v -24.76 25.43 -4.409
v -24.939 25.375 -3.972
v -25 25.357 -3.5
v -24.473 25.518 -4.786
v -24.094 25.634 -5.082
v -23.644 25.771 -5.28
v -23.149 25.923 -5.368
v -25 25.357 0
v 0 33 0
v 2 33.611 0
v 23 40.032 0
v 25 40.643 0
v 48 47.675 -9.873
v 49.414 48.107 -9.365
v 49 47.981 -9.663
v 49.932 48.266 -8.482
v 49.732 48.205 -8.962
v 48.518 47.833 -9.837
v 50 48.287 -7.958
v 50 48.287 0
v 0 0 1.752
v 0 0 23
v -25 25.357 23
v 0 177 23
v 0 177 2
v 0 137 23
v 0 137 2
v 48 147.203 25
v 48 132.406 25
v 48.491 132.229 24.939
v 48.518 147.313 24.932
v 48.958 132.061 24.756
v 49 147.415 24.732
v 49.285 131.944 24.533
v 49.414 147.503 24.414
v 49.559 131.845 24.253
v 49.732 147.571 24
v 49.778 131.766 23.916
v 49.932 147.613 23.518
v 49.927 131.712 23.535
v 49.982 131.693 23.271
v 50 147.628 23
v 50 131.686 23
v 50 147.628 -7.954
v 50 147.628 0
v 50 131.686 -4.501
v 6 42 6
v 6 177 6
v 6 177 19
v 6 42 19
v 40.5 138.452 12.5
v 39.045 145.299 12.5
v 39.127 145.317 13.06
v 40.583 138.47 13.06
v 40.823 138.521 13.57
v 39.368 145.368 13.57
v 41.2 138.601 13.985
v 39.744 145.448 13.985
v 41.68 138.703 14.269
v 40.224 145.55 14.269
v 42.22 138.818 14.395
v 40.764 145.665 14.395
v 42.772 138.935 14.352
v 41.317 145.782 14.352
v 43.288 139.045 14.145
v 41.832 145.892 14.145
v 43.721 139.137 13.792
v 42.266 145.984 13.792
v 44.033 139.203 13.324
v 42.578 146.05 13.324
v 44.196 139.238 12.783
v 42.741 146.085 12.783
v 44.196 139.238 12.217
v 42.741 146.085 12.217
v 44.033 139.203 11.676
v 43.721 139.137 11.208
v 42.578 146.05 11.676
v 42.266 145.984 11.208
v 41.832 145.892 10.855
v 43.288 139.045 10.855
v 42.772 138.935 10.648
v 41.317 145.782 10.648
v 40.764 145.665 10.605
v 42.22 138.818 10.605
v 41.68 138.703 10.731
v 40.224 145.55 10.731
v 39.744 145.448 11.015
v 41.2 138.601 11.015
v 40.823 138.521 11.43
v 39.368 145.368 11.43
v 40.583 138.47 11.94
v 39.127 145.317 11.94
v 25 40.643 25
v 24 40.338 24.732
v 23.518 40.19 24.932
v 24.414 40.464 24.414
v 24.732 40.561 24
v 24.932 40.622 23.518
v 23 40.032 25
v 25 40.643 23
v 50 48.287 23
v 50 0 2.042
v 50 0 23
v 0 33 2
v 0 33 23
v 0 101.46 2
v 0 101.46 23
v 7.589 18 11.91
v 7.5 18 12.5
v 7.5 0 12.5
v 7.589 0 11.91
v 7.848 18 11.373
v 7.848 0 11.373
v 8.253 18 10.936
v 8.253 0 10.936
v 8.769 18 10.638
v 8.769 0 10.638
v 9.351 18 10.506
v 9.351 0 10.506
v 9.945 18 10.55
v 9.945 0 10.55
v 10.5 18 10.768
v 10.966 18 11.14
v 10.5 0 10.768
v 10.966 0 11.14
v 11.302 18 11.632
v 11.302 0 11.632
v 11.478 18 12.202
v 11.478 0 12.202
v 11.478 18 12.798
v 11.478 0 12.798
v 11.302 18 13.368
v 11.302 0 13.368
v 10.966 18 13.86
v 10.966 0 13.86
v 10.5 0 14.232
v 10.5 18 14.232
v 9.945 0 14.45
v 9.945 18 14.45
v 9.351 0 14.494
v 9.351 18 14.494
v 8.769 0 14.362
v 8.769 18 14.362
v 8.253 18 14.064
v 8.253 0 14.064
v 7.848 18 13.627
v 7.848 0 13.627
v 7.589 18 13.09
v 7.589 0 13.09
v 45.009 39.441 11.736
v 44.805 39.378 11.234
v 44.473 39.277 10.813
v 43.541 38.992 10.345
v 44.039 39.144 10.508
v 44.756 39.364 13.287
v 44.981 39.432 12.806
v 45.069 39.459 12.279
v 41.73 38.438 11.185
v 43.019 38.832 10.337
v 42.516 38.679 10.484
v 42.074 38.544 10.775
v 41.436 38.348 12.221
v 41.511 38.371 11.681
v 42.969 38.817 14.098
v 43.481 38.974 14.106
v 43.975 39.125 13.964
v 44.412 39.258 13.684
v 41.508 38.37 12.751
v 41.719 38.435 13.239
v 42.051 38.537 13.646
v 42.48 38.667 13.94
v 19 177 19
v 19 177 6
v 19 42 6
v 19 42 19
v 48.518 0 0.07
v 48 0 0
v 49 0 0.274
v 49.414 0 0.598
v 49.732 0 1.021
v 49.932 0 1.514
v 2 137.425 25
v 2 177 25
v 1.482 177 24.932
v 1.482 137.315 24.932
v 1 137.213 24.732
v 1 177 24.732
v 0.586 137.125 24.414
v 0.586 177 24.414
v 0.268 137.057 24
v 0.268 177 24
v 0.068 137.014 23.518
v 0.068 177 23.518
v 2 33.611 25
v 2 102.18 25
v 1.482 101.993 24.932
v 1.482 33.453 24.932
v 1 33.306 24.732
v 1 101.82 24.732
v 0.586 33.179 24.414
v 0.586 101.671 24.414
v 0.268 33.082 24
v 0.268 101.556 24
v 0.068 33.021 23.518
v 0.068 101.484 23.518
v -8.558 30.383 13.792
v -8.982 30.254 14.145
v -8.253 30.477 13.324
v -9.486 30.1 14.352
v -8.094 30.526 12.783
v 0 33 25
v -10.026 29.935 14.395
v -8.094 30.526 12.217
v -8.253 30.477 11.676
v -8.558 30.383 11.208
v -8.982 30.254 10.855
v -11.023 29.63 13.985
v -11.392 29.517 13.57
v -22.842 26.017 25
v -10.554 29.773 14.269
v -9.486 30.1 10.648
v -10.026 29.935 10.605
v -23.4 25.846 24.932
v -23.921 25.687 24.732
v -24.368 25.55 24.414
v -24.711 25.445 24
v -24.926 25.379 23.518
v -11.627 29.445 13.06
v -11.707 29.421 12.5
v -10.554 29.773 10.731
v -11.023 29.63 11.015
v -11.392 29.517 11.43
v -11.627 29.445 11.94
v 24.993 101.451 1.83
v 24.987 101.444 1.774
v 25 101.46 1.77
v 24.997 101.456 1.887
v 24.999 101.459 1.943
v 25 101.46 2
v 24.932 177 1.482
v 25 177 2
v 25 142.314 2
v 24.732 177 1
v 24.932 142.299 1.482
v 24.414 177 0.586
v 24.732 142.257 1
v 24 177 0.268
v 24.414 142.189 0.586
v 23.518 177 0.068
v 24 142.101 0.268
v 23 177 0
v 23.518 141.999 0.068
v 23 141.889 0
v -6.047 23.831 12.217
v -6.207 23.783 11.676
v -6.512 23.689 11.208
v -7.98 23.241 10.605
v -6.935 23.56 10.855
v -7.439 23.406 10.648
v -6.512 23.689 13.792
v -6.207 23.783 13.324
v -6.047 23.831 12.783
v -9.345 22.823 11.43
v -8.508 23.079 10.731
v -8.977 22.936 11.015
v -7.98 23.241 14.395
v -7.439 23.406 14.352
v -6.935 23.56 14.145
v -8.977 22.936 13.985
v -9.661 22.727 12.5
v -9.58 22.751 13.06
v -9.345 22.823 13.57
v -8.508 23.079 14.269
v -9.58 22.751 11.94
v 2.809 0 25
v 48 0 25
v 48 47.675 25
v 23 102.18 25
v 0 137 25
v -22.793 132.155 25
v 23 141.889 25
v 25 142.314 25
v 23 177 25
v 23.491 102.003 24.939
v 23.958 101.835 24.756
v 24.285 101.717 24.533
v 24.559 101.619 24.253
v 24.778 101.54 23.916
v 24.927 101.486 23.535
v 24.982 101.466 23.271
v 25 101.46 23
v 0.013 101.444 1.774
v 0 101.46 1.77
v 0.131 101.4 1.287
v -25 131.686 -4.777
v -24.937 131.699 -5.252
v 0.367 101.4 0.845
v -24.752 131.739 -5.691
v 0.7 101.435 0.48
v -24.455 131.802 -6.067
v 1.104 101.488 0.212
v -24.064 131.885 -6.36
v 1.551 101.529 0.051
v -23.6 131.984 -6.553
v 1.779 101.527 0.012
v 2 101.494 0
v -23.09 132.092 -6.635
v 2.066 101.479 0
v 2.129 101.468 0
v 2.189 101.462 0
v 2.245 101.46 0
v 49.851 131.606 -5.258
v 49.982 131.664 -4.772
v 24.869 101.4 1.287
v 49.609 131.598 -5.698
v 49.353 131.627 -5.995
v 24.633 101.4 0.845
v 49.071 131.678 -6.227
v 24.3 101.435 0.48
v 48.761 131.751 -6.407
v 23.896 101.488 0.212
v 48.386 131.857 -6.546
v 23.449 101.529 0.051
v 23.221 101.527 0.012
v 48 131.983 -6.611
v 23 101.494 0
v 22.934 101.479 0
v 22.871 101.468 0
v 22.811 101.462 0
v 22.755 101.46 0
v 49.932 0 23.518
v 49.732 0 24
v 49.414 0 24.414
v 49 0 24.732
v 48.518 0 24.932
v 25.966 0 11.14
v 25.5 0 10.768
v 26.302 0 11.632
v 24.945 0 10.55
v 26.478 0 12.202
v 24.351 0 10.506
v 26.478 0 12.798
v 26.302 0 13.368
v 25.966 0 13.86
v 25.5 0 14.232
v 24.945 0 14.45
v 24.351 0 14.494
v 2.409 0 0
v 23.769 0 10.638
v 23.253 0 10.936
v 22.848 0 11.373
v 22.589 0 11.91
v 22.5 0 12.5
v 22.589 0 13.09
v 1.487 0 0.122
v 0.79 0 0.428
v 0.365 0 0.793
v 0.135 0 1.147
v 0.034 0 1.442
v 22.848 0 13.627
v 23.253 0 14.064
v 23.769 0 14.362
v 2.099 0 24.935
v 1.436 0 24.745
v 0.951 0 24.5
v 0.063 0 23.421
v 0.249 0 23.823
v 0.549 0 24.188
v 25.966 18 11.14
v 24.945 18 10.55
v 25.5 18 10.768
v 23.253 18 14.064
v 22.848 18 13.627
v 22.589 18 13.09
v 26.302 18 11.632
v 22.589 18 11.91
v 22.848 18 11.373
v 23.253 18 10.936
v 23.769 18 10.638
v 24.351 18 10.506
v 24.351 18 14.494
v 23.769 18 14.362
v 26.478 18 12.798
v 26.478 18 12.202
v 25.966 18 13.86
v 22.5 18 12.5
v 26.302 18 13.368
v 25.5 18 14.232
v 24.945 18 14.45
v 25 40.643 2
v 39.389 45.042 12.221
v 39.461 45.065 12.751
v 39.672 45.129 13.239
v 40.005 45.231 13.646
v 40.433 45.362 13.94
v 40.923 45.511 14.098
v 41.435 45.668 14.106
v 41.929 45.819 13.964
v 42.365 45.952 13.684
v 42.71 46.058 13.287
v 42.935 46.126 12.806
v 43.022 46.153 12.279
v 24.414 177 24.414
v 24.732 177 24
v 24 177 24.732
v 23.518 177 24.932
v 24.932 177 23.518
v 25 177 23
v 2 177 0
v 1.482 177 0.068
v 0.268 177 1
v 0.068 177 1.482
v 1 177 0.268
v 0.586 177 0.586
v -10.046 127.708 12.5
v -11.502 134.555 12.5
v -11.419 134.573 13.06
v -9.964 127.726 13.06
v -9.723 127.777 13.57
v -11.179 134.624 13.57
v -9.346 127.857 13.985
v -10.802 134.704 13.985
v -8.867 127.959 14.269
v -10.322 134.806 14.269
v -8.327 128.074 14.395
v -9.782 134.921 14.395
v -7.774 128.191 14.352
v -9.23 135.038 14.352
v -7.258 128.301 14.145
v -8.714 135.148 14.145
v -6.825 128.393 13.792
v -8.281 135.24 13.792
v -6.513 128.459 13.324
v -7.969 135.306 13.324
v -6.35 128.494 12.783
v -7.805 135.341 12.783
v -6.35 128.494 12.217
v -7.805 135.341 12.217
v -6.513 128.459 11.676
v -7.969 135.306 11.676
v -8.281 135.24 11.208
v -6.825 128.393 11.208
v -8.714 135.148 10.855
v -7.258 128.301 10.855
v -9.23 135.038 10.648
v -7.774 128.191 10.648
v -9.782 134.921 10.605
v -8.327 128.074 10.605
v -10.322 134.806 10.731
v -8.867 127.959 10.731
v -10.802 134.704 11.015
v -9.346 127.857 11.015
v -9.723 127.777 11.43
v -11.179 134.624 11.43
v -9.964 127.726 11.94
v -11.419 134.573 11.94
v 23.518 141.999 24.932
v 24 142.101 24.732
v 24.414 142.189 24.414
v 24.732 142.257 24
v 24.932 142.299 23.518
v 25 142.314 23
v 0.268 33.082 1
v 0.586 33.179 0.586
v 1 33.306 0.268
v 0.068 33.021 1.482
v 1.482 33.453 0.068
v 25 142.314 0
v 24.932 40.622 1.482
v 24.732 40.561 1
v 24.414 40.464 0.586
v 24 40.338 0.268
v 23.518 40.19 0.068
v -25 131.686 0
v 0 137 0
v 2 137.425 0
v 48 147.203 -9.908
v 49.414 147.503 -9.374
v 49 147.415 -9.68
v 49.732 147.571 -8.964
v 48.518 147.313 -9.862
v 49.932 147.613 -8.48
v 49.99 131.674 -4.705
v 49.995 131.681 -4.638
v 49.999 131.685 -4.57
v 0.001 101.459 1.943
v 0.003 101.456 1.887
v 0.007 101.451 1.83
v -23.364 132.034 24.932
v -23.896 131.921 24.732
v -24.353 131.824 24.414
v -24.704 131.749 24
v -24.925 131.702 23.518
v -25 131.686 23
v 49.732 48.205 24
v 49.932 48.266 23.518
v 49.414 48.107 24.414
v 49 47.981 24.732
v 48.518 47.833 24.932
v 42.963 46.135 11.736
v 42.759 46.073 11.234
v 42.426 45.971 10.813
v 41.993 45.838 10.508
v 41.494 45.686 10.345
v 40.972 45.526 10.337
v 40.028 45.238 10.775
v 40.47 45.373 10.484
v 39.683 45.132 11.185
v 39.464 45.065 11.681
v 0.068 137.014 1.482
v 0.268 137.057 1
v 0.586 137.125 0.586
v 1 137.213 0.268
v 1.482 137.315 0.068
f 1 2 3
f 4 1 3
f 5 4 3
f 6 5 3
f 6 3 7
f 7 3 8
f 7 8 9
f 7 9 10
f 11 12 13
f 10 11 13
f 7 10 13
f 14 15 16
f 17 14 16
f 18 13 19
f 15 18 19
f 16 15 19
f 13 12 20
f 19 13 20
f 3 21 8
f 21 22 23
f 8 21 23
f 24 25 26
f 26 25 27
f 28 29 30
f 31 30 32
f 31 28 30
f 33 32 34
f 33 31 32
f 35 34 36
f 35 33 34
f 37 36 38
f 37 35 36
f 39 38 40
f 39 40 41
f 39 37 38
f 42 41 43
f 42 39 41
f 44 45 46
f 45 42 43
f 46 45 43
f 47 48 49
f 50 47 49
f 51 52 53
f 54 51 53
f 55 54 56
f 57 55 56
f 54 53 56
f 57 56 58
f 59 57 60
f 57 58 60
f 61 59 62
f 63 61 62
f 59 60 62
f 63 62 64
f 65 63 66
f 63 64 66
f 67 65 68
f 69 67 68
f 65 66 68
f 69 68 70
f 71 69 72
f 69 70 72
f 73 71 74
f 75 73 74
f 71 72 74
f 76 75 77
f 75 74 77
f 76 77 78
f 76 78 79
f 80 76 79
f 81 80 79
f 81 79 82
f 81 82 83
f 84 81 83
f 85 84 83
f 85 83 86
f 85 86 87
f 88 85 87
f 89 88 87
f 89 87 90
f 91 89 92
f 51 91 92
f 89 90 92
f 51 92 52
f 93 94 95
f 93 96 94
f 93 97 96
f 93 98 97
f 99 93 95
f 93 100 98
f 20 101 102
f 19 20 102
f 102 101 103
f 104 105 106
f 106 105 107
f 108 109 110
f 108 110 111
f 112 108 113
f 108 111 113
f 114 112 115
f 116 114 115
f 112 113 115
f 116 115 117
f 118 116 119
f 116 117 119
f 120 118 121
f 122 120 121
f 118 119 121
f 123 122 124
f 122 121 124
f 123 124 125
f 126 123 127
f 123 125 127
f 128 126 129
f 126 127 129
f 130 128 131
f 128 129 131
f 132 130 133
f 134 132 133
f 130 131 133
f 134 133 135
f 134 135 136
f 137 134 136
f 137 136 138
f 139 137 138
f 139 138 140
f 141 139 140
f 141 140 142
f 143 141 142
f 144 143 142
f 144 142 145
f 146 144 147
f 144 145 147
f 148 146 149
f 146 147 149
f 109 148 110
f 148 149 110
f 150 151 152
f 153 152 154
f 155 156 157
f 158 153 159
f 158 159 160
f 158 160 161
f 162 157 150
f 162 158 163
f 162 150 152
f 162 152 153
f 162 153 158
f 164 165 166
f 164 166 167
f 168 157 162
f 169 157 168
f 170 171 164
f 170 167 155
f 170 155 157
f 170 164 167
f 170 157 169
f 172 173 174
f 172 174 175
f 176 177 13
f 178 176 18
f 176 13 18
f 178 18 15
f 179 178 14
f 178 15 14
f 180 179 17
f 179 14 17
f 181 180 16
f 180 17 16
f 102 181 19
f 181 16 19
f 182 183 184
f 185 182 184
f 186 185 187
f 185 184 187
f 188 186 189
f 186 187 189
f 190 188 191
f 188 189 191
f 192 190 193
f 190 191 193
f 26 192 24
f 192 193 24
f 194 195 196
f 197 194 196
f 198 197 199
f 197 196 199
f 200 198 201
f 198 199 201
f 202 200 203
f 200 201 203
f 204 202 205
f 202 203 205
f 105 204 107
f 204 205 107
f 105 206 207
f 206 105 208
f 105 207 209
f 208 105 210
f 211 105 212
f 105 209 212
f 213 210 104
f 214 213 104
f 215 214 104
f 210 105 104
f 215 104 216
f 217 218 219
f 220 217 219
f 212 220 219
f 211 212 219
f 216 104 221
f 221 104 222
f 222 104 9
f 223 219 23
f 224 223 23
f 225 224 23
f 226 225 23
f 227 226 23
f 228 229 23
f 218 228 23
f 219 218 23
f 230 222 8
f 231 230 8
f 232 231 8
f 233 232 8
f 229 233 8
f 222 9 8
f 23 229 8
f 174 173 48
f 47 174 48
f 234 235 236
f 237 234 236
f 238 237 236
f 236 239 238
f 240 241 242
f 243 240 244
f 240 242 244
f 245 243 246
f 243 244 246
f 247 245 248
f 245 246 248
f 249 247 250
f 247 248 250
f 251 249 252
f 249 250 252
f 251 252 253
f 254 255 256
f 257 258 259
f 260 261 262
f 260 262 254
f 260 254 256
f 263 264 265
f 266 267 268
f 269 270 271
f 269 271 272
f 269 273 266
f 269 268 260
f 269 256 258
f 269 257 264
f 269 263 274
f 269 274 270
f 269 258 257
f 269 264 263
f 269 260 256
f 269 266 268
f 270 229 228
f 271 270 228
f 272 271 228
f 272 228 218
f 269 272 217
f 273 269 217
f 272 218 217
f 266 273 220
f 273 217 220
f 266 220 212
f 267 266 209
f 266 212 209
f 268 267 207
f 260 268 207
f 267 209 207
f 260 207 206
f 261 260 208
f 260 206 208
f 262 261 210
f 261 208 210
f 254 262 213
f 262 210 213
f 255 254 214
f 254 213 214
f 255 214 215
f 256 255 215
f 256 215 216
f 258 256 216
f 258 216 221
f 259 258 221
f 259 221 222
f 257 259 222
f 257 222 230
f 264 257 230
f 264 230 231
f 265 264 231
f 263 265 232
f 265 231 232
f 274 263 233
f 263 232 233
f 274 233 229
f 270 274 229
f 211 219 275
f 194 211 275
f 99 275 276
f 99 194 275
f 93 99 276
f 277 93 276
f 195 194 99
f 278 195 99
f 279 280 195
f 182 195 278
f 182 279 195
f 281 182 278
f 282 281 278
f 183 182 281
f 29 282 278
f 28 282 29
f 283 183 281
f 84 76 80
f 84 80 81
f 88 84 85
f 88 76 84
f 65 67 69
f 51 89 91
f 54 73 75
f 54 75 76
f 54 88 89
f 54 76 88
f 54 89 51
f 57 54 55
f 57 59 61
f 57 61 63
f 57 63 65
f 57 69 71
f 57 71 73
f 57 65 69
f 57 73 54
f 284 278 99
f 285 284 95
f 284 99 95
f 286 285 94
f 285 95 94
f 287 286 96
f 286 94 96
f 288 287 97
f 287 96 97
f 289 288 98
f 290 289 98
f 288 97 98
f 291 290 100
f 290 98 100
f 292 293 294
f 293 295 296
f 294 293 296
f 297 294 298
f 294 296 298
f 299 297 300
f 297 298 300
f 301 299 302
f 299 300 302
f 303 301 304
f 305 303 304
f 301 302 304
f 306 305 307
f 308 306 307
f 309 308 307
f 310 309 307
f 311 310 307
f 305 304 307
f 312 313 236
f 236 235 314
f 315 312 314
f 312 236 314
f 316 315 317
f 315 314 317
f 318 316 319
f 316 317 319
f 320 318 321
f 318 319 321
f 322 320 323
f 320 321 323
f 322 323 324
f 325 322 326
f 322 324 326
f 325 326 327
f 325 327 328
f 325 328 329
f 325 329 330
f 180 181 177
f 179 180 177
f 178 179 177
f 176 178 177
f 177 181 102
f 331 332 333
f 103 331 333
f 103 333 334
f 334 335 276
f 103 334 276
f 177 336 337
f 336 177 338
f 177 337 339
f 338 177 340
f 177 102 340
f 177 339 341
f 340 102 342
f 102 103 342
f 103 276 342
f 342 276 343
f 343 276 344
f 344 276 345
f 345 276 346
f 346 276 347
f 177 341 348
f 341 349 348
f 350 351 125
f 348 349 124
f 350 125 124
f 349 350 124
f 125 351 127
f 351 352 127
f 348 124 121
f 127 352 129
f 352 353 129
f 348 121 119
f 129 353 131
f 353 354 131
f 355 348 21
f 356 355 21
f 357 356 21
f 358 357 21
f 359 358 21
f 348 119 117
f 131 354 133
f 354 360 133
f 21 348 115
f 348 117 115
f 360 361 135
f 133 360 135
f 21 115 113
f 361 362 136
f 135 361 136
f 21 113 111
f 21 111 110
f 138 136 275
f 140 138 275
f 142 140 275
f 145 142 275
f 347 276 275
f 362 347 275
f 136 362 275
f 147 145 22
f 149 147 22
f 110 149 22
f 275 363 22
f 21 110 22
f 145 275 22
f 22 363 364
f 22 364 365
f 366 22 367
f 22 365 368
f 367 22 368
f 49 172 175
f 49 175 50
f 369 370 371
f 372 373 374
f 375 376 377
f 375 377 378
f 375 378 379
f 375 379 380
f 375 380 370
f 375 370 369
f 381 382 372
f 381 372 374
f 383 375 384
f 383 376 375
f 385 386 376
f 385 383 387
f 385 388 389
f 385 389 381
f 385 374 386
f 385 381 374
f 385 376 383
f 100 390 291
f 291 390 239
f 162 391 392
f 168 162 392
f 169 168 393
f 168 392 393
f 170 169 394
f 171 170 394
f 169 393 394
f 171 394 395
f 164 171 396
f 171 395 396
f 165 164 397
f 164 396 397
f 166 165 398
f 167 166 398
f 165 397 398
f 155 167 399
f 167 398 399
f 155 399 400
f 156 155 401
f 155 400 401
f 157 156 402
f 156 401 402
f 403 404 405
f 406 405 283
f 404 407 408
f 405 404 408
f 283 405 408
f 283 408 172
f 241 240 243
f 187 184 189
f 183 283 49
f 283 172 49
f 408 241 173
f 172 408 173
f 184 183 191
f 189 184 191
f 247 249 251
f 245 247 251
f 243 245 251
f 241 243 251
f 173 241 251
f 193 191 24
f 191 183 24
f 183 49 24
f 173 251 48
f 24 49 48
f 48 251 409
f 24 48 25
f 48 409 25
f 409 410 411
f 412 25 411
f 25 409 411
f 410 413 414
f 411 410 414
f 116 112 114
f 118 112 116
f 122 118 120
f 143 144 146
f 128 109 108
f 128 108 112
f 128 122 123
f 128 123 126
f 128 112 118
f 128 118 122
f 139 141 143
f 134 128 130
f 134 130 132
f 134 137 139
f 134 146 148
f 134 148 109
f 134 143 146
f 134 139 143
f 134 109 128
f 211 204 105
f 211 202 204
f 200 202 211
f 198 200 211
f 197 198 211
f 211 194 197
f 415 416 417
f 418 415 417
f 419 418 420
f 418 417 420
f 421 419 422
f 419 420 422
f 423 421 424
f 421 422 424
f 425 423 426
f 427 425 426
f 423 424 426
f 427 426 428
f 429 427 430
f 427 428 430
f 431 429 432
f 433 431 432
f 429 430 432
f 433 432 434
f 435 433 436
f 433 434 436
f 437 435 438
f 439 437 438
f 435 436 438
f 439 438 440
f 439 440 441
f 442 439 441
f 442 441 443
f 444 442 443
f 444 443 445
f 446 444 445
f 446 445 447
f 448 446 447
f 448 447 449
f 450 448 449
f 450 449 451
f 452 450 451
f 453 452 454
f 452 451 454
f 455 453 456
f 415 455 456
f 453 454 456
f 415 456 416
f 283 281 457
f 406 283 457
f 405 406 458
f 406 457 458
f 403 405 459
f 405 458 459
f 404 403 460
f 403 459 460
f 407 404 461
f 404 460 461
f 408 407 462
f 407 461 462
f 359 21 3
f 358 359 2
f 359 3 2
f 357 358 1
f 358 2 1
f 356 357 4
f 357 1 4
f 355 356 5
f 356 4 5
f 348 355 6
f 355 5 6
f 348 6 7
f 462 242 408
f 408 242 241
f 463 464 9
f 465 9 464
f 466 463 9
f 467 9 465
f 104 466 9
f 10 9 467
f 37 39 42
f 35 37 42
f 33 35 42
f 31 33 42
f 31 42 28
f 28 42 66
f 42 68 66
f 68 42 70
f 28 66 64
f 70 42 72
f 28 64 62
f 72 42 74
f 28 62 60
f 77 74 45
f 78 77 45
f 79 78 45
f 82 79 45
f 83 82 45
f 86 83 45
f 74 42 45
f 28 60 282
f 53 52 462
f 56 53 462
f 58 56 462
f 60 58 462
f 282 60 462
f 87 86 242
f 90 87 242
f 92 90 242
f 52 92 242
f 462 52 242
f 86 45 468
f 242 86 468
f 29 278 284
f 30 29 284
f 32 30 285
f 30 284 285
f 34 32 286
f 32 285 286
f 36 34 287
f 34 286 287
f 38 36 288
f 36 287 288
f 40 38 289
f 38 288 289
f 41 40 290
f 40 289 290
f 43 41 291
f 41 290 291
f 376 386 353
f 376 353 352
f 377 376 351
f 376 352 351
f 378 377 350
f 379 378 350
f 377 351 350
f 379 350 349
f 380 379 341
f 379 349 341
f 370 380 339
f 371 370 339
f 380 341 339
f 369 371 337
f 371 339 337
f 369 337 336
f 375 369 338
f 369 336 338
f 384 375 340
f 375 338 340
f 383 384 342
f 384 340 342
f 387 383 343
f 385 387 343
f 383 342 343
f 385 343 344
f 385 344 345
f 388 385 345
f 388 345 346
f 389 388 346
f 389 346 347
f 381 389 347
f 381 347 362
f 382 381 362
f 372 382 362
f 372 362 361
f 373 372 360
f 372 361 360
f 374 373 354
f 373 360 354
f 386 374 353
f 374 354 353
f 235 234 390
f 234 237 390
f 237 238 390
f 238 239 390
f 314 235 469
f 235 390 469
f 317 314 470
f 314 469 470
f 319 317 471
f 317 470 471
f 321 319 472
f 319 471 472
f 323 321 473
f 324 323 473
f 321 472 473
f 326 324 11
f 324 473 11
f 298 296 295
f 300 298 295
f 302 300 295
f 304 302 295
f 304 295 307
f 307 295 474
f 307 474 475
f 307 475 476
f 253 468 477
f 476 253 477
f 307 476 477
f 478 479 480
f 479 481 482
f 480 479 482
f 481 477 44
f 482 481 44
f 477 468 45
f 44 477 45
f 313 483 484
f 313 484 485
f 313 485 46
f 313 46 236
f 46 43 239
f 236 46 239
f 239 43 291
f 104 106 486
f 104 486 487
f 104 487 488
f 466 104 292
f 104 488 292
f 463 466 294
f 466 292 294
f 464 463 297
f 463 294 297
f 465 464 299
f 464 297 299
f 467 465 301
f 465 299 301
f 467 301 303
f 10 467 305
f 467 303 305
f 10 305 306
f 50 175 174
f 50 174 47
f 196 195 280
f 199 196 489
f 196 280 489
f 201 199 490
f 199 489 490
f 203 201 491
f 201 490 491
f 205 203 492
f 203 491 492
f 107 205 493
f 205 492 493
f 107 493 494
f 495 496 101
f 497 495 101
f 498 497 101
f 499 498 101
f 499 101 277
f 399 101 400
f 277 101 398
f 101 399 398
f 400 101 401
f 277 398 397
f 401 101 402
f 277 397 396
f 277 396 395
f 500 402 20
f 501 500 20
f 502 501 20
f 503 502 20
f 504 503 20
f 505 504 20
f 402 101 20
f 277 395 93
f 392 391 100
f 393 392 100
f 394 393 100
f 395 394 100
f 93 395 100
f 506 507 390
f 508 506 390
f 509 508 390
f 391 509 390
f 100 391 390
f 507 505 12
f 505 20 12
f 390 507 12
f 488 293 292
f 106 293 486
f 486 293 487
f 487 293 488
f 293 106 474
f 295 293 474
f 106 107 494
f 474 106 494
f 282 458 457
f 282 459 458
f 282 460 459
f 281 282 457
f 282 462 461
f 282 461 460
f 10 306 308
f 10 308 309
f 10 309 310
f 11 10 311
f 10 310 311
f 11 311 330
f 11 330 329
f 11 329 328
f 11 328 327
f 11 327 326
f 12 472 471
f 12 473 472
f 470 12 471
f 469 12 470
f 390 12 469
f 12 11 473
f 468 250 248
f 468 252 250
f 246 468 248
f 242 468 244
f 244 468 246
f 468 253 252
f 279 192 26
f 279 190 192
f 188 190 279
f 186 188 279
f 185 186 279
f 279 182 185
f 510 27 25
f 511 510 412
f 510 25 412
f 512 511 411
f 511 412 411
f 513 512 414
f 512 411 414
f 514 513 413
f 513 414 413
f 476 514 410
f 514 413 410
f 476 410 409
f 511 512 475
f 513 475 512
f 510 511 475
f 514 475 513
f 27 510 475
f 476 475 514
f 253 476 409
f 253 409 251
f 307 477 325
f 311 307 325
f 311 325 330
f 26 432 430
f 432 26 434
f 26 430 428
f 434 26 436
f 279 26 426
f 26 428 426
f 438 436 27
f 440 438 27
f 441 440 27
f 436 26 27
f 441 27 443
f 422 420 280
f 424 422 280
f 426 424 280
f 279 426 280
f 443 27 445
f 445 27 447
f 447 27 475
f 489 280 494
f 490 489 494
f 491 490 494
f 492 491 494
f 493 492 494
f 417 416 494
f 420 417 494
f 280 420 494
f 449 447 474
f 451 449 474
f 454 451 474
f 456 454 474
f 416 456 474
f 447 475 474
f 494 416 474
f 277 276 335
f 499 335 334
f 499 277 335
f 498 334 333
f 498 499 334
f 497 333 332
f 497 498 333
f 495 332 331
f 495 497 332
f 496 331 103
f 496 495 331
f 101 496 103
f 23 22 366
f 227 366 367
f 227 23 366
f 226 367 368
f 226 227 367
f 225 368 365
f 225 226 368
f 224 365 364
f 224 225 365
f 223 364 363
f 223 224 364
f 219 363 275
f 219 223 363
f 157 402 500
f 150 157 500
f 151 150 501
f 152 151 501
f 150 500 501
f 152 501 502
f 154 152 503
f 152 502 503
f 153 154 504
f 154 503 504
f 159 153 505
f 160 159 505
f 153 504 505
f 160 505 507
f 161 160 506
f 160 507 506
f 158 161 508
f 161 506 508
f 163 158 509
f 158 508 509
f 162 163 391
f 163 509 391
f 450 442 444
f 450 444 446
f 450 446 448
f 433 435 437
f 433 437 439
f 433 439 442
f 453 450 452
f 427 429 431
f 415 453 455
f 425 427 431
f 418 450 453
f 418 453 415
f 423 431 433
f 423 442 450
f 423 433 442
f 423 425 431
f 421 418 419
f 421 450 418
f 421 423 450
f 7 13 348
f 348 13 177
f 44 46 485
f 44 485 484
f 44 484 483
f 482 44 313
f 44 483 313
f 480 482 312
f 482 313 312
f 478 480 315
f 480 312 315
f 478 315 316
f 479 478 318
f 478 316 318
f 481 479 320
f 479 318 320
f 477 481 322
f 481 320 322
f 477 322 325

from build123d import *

# Parameters (mm, degrees)
F0_W           = 25
F0_H           = 33
F1_DEPTH       = 25
F3_DEPTH       = 10
F5_DEPTH       = 81.7
F7_DEPTH       = 10
F9_DEPTH       = 92
F10_W          = 13
F10_H          = 13
F11_DEPTH      = 135
F12_R          = 1.9
F13_DEPTH      = 7
F14_R          = 1.9
F15_DEPTH      = 7
F17_DEPTH      = 18
F18_T1_DEPTH   = 26.3114146799
F18_T3_DEPTH   = 25.9417421253
F18_T5_DEPTH   = 59.3111485648
F18_T7_DEPTH   = 58.2865340729
F18_T9_DEPTH   = 45.6084808239
F18_T11_DEPTH  = 44.6581070284
F18_T16_DEPTH  = 49.2253281189
F18_T21_DEPTH  = 48.4985768834
F18_T27_DEPTH  = 48.4985768834
F18_T33_DEPTH  = 48.4985768834
F18_T39_DEPTH  = 48.4985768834
F18_T45_DEPTH  = 48.4985768834
F18_T51_DEPTH  = 48.4985768834
F18_T57_DEPTH  = 49.2253281189
F18_T62_DEPTH  = 70.8165659944
F18_T69_DEPTH  = 70.8165659944
F18_T75_DEPTH  = 70.8165659944
F18_T81_DEPTH  = 70.8165659944
F18_T87_DEPTH  = 78.4598330308
F18_T93_DEPTH  = 78.4598330308
F18_T99_DEPTH  = 78.4598330308
F18_T106_DEPTH = 78.4598330308
F18_T112_DEPTH = 50
F18_T117_DEPTH = 50
F18_T122_DEPTH = 44.6860859582
F18_T127_DEPTH = 44.6860859582
F18_T133_DEPTH = 70.8165659944
F18_T137_DEPTH = 49.2253281189
F18_T144_DEPTH = 70.8165659944
F18_T149_DEPTH = 48.4985768834
F18_T157_DEPTH = 48.4985768834
F18_T162_DEPTH = 78.4598330308
F18_T170_DEPTH = 49.2253281189
F18_T174_DEPTH = 78.4598330308


# Not quite as in the source:
# - a fillet or chamfer that OpenCascade refuses, or shapes differently, is made with other operations: its cross-section is extruded or revolved along the edge and cut away or added


with BuildPart() as f1:
    # F0 (on Top) → F1 (new body)
    with BuildSketch(Plane.XY):
        with Locations((12.5, 16.5)):
            Rectangle(F0_W, F0_H)
        Polygon((-25, 25.3567329635), (0, 0), (0, 33), align=None)
        with Locations((37.5, 16.5)):
            Rectangle(F0_W, F0_H)
        Polygon((25, 40.6432670365), (0, 33), (25, 33), align=None)
        Polygon((0, 101.4598330308), (0, 33), (25, 40.6432670365), (25, 101.4598330308), (25, 137), (0, 137), align=None)
        Polygon((25, 40.6432670365), (25, 33), (50, 33), (50, 48.2865340729), align=None)
        Polygon((-25, 131.6860859582), (0, 101.4598330308), (0, 137), align=None)
        Polygon((25, 137), (25, 101.4598330308), (50, 131.6860859582), (50, 147.6278280835), (25, 142.3139140418), align=None)
        Polygon((25, 142.3139140418), (0, 137), (25, 137), align=None)
        Polygon((0, 177), (0, 137), (25, 142.3139140418), (25, 177), align=None)
    extrude(amount=F1_DEPTH)

    # F2 (on face) → F3 (join)
    with BuildSketch(Plane(origin=(0, 0, 0), x_dir=(1, 0, 0), z_dir=(0, 0, -1))):
        Polygon((50, -131.6860859582), (25, -101.4598330308), (0, -101.4598330308), (-25, -131.6860859582), (50, -147.6278280835), align=None)
    extrude(amount=F3_DEPTH)

    # F4 (on face) → F5 (cut, symmetric)
    with BuildSketch(Plane.YZ.offset(25)):
        Polygon((101.4598330308, -21.1370438337), (147.6278330308, -10), (101.4598330308, 0), align=None)
    extrude(amount=F5_DEPTH, both=True, mode=Mode.SUBTRACT)

    # F6 (on face) → F7 (join)
    with BuildSketch(Plane(origin=(0, 0, 0), x_dir=(1, 0, 0), z_dir=(0, 0, -1))):
        Polygon((50, -48.2865340729), (50, 0), (0, 0), (-25, -25.3567329635), align=None)
    extrude(amount=F7_DEPTH)

    # F8 (on face) → F9 (cut)
    with BuildSketch(Plane.YZ.offset(50)):
        Polygon((48.2865340729, -10), (0, 0), (0, -39.534393698), (48.2865340729, -39.534393698), align=None)
    extrude(amount=-F9_DEPTH, mode=Mode.SUBTRACT)

    # F10 (on face) → F11 (cut)
    with BuildSketch(Plane(origin=(0, 177, 0), x_dir=(-1, 0, 0), z_dir=(0, 1, 0))):
        with Locations((-12.5, 12.5)):
            Rectangle(F10_W, F10_H)
    extrude(amount=-F11_DEPTH, mode=Mode.SUBTRACT)

    # F12 (on face) → F13 (cut)
    with BuildSketch(Plane(origin=(-27.8614600507, 131.0778638485, 0), x_dir=(-0.9781476007, -0.2079116908, 0), z_dir=(-0.2079116908, 0.9781476007, 0))):
        with Locations((-18.6253867704, 12.5)):
            Circle(F12_R)
        with BuildLine():
            ThreePointArc((-72.2009313853, 12.5), (-70.3009313853, 10.6), (-68.4009313853, 12.5))
            ThreePointArc((-68.4009313853, 12.5), (-70.3009313853, 14.4), (-72.2009313853, 12.5))
        make_face()
    extrude(amount=-F13_DEPTH, mode=Mode.SUBTRACT)

    # F14 (on face) → F15 (cut)
    with BuildSketch(Plane(origin=(-9.2266829073, 30.1791199472, 0), x_dir=(-0.956304756, -0.2923717047, 0), z_dir=(-0.2923717047, 0.956304756, 0))):
        with Locations((0.6940276563, 12.5)):
            Circle(F14_R)
        with BuildLine():
            ThreePointArc((-54.6362143833, 12.2785296088), (-52.7659137894, 10.3211052927), (-50.8370889828, 12.2208866302))
            ThreePointArc((-50.8370889828, 12.2208866302), (-52.7082641762, 14.1206679678), (-54.6362143833, 12.2785296088))
        make_face()
    extrude(amount=-F15_DEPTH, mode=Mode.SUBTRACT)

    # F16 (on face) → F17 (cut)
    with BuildSketch(Plane.XZ):
        with BuildLine():
            ThreePointArc((11.5, 12.5), (9.5, 14.5), (7.5, 12.5))
            Line((7.5, 12.5), (9.5, 12.5))
            Line((9.5, 12.5), (11.5, 12.5))
        make_face()
        with BuildLine():
            ThreePointArc((26.5, 12.5), (24.5, 14.5), (22.5, 12.5))
            ThreePointArc((22.5, 12.5), (24.5, 10.5), (26.5, 12.5))
        make_face()
        with BuildLine():
            Line((9.5, 12.5), (7.5, 12.5))
            ThreePointArc((7.5, 12.5), (9.5, 10.5), (11.5, 12.5))
            Line((11.5, 12.5), (9.5, 12.5))
        make_face()
    extrude(amount=-F17_DEPTH, mode=Mode.SUBTRACT)

    # F18: fillet of radius 2 on 18 edges, made by hand

    # F18_s2 → F18_t1 (cut)
    with BuildSketch(Plane(origin=(0, 122.2526609766, -26.4799560251), x_dir=(1, 0, 0), z_dir=(0, 0.9773365731, -0.2116913388))):
        with BuildLine():
            ThreePointArc((50, -23.478167891), (49.4142135624, -22.0639543286), (48, -21.478167891))
            Line((48, -21.478167891), (50, -21.478167891))
            Line((50, -21.478167891), (50, -23.478167891))
        make_face()
    extrude(amount=F18_T1_DEPTH, mode=Mode.SUBTRACT)

    # F18_s4 → F18_t3 (cut)
    with BuildSketch(Plane.XZ.offset(-152.6278280835)):
        with BuildLine():
            ThreePointArc((48, 25), (49.4142135624, 24.4142135624), (50, 23))
            Line((50, 23), (50, 25))
            Line((50, 25), (48, 25))
        make_face()
    extrude(amount=F18_T3_DEPTH, mode=Mode.SUBTRACT)

    # F18_s6 → F18_t5 (cut)
    with BuildSketch(Plane(origin=(0, 53.1826412899, -11.0139694867), x_dir=(1, 0, 0), z_dir=(0, -0.9792214434, 0.2027938973))):
        with BuildLine():
            ThreePointArc((48, 0), (49.4142135624, 0.5857864376), (50, 2))
            Line((50, 2), (50, 0))
            Line((50, 0), (48, 0))
        make_face()
    extrude(amount=F18_T5_DEPTH, mode=Mode.SUBTRACT)

    # F18_s8 → F18_t7 (cut)
    with BuildSketch(Plane.XZ.offset(-53.2865340729)):
        with BuildLine():
            ThreePointArc((48, 25), (49.4142135624, 24.4142135624), (50, 23))
            Line((50, 23), (50, 25))
            Line((50, 25), (48, 25))
        make_face()
    extrude(amount=F18_T7_DEPTH, mode=Mode.SUBTRACT)

    # F18_s10 → F18_t9 (cut)
    with BuildSketch(Plane(origin=(-28.5103996887, 28.9172236636, 0), x_dir=(0, 0, 1), z_dir=(0.7020799377, -0.71209814, 0))):
        with BuildLine():
            ThreePointArc((23, 0), (24.4142135624, -0.5857864376), (25, -2))
            Line((25, -2), (25, 0))
            Line((25, 0), (23, 0))
        make_face()
    extrude(amount=F18_T9_DEPTH, mode=Mode.SUBTRACT)

    # F18_s12 → F18_t11 (cut)
    with BuildSketch(Plane(origin=(-28.0090391043, 28.4087090053, -5.8833605581), x_dir=(0.71209814, 0.7020799377, 0), z_dir=(0.6945676893, -0.7044786969, 0.145895478))):
        with BuildLine():
            ThreePointArc((0, 1.7328989819), (0.4884593774, 0.4232253789), (1.7152449464, -0.2467258713))
            Line((1.7152449464, -0.2467258713), (0, 0))
            Line((0, 0), (0, 1.7328989819))
        make_face()
    extrude(amount=F18_T11_DEPTH, mode=Mode.SUBTRACT)


with BuildPart() as f18_tool14:
    # F18_s15 → F18_t16 (new body)
    with BuildSketch(Plane(origin=(56.7978037382, 68.6713912604, 0), x_dir=(0, 0, 1), z_dir=(0.6373432983, 0.7705799894, 0))):
        with BuildLine():
            ThreePointArc((25, -47.4002448925), (24.4142135624, -45.9860313302), (23, -45.4002448925))
            Line((23, -45.4002448925), (25, -45.4002448925))
            Line((25, -45.4002448925), (25, -47.4002448925))
        make_face()
    extrude(amount=F18_T16_DEPTH)

    split(bisect_by=Plane.YZ.offset(25), keep=Keep.TOP)


with BuildPart() as f1_1:
    add(f1.part)

    # F18_t13: cut F18_tool14
    add(f18_tool14.part, mode=Mode.SUBTRACT)


with BuildPart() as f18_tool19:
    # F18_s20 → F18_t21 (new body)
    with BuildSketch(Plane(origin=(55.6145080943, 67.2407275237, -14.5643578937), x_dir=(-0.7705799894, 0.6373432983, 0), z_dir=(0.6286469564, 0.7600656763, -0.1646304099))):
        with BuildLine():
            ThreePointArc((45.4002448925, 17.2405635017), (45.8936460368, 15.9252080791), (47.1304047803, 15.258850527))
            Line((47.1304047803, 15.258850527), (45.4002448925, 15.4944378922))
            Line((45.4002448925, 15.4944378922), (45.4002448925, 17.2405635017))
        make_face()
    extrude(amount=F18_T21_DEPTH)

    split(bisect_by=Plane.YZ.offset(25), keep=Keep.BOTTOM)

    split(bisect_by=Plane.XY, keep=Keep.BOTTOM)


with BuildPart() as f1_2:
    add(f1_1.part)

    # F18_t18: cut F18_tool19
    add(f18_tool19.part, mode=Mode.SUBTRACT)


with BuildPart() as f18_tool25:
    # F18_s26 → F18_t27 (new body)
    with BuildSketch(Plane(origin=(55.6145080943, 67.2407275237, -14.5643578937), x_dir=(-0.7705799894, 0.6373432983, 0), z_dir=(0.6286469564, 0.7600656763, -0.1646304099))):
        with BuildLine():
            ThreePointArc((45.4002448925, 17.2405635017), (45.8936460368, 15.9252080791), (47.1304047803, 15.258850527))
            Line((47.1304047803, 15.258850527), (45.4002448925, 15.4944378922))
            Line((45.4002448925, 15.4944378922), (45.4002448925, 17.2405635017))
        make_face()
    extrude(amount=F18_T27_DEPTH)

    split(bisect_by=Plane.YZ.offset(25), keep=Keep.TOP)

    split(bisect_by=Plane.XY, keep=Keep.TOP)


with BuildPart() as f1_3:
    add(f1_2.part)

    # F18_t24: cut F18_tool25
    add(f18_tool25.part, mode=Mode.SUBTRACT)


with BuildPart() as f18_tool31:
    # F18_s32 → F18_t33 (new body)
    with BuildSketch(Plane(origin=(55.6145080943, 67.2407275237, -14.5643578937), x_dir=(-0.7705799894, 0.6373432983, 0), z_dir=(0.6286469564, 0.7600656763, -0.1646304099))):
        with BuildLine():
            ThreePointArc((45.4002448925, 17.2405635017), (45.8936460368, 15.9252080791), (47.1304047803, 15.258850527))
            Line((47.1304047803, 15.258850527), (45.4002448925, 15.4944378922))
            Line((45.4002448925, 15.4944378922), (45.4002448925, 17.2405635017))
        make_face()
    extrude(amount=F18_T33_DEPTH)

    split(bisect_by=Plane.YZ.offset(25), keep=Keep.TOP)

    split(bisect_by=Plane.XY, keep=Keep.BOTTOM)


with BuildPart() as f1_4:
    add(f1_3.part)

    # F18_t30: cut F18_tool31
    add(f18_tool31.part, mode=Mode.SUBTRACT)


with BuildPart() as f18_tool37:
    # F18_s38 → F18_t39 (new body)
    with BuildSketch(Plane(origin=(-76.2230659478, 92.1575068097, -19.9613383317), x_dir=(0.7705799894, 0.6373432983, 0), z_dir=(0.6286469564, -0.7600656763, 0.1646304099))):
        with BuildLine():
            ThreePointArc((64.6647446284, 14.617411291), (65.1581457726, 13.3020558683), (66.3949045162, 12.6356983163))
            Line((66.3949045162, 12.6356983163), (64.6647446284, 12.8712856815))
            Line((64.6647446284, 12.8712856815), (64.6647446284, 14.617411291))
        make_face()
    extrude(amount=F18_T39_DEPTH)

    split(bisect_by=Plane.YZ, keep=Keep.BOTTOM)

    split(bisect_by=Plane.XY, keep=Keep.BOTTOM)


with BuildPart() as f1_5:
    add(f1_4.part)

    # F18_t36: cut F18_tool37
    add(f18_tool37.part, mode=Mode.SUBTRACT)


with BuildPart() as f18_tool43:
    # F18_s44 → F18_t45 (new body)
    with BuildSketch(Plane(origin=(-76.2230659478, 92.1575068097, -19.9613383317), x_dir=(0.7705799894, 0.6373432983, 0), z_dir=(0.6286469564, -0.7600656763, 0.1646304099))):
        with BuildLine():
            ThreePointArc((64.6647446284, 14.617411291), (65.1581457726, 13.3020558683), (66.3949045162, 12.6356983163))
            Line((66.3949045162, 12.6356983163), (64.6647446284, 12.8712856815))
            Line((64.6647446284, 12.8712856815), (64.6647446284, 14.617411291))
        make_face()
    extrude(amount=F18_T45_DEPTH)

    split(bisect_by=Plane.YZ, keep=Keep.TOP)

    split(bisect_by=Plane.XY, keep=Keep.BOTTOM)


with BuildPart() as f1_6:
    add(f1_5.part)

    # F18_t42: cut F18_tool43
    add(f18_tool43.part, mode=Mode.SUBTRACT)


with BuildPart() as f18_tool49:
    # F18_s50 → F18_t51 (new body)
    with BuildSketch(Plane(origin=(-76.2230659478, 92.1575068097, -19.9613383317), x_dir=(0.7705799894, 0.6373432983, 0), z_dir=(0.6286469564, -0.7600656763, 0.1646304099))):
        with BuildLine():
            ThreePointArc((64.6647446284, 14.617411291), (65.1581457726, 13.3020558683), (66.3949045162, 12.6356983163))
            Line((66.3949045162, 12.6356983163), (64.6647446284, 12.8712856815))
            Line((64.6647446284, 12.8712856815), (64.6647446284, 14.617411291))
        make_face()
    extrude(amount=F18_T51_DEPTH)

    split(bisect_by=Plane.YZ, keep=Keep.BOTTOM)

    split(bisect_by=Plane.XY, keep=Keep.TOP)


with BuildPart() as f1_7:
    add(f1_6.part)

    # F18_t48: cut F18_tool49
    add(f18_tool49.part, mode=Mode.SUBTRACT)


with BuildPart() as f18_tool55:
    # F18_s56 → F18_t57 (new body)
    with BuildSketch(Plane(origin=(-78.016074724, 94.3253442805, 0), x_dir=(0, 0, 1), z_dir=(0.6373432983, -0.7705799894, 0))):
        with BuildLine():
            ThreePointArc((25, -66.6647446284), (24.4142135624, -65.250531066), (23, -64.6647446284))
            Line((23, -64.6647446284), (25, -64.6647446284))
            Line((25, -64.6647446284), (25, -66.6647446284))
        make_face()
    extrude(amount=F18_T57_DEPTH)

    split(bisect_by=Plane.YZ, keep=Keep.BOTTOM)


with BuildPart() as f1_8:
    add(f1_7.part)

    # F18_t54: cut F18_tool55
    add(f18_tool55.part, mode=Mode.SUBTRACT)


with BuildPart() as f18_tool60:
    # F18_s61 → F18_t62 (new body)
    with BuildSketch(Plane.XZ.offset(-35.6432670365)):
        with BuildLine():
            ThreePointArc((25, 2), (24.4142135624, 0.5857864376), (23, 0))
            Line((23, 0), (25, 0))
            Line((25, 0), (25, 2))
        make_face()
    extrude(amount=-F18_T62_DEPTH)

    split(bisect_by=Plane(origin=(-9.2266829073, 30.1791199472, 0), x_dir=(0, 0, 1), z_dir=(-0.2923717047, 0.956304756, 0)), keep=Keep.TOP)

    split(bisect_by=Plane(origin=(-34.9845202296, 28.9355418232, 0), x_dir=(0, 0, 1), z_dir=(0.7705799894, -0.6373432983, 0)), keep=Keep.TOP)

    split(bisect_by=Plane(origin=(0, 4.5467421163, 20.9913990025), x_dir=(1, 0, 0), z_dir=(0, -0.2116913388, -0.9773365731)), keep=Keep.TOP)


with BuildPart() as f1_9:
    add(f1_8.part)

    # F18_t59: cut F18_tool60
    add(f18_tool60.part, mode=Mode.SUBTRACT)


with BuildPart() as f18_tool67:
    # F18_s68 → F18_t69 (new body)
    with BuildSketch(Plane.XZ.offset(-35.6432670365)):
        with BuildLine():
            ThreePointArc((25, 2), (24.4142135624, 0.5857864376), (23, 0))
            Line((23, 0), (25, 0))
            Line((25, 0), (25, 2))
        make_face()
    extrude(amount=-F18_T69_DEPTH)

    split(bisect_by=Plane(origin=(-34.9845202296, 28.9355418232, 0), x_dir=(0, 0, 1), z_dir=(-0.7705799894, 0.6373432983, 0)), keep=Keep.TOP)

    split(bisect_by=Plane(origin=(0, 4.5467421163, 20.9913990025), x_dir=(1, 0, 0), z_dir=(0, -0.2116913388, -0.9773365731)), keep=Keep.TOP)


with BuildPart() as f1_10:
    add(f1_9.part)

    # F18_t66: cut F18_tool67
    add(f18_tool67.part, mode=Mode.SUBTRACT)


with BuildPart() as f18_tool73:
    # F18_s74 → F18_t75 (new body)
    with BuildSketch(Plane.XZ.offset(-35.6432670365)):
        with BuildLine():
            ThreePointArc((25, 2), (24.4142135624, 0.5857864376), (23, 0))
            Line((23, 0), (25, 0))
            Line((25, 0), (25, 2))
        make_face()
    extrude(amount=-F18_T75_DEPTH)

    split(bisect_by=Plane(origin=(-34.9845202296, 28.9355418232, 0), x_dir=(0, 0, 1), z_dir=(0.7705799894, -0.6373432983, 0)), keep=Keep.TOP)

    split(bisect_by=Plane(origin=(0, 4.5467421163, 20.9913990025), x_dir=(1, 0, 0), z_dir=(0, 0.2116913388, 0.9773365731)), keep=Keep.TOP)


with BuildPart() as f1_11:
    add(f1_10.part)

    # F18_t72: cut F18_tool73
    add(f18_tool73.part, mode=Mode.SUBTRACT)


with BuildPart() as f18_tool79:
    # F18_s80 → F18_t81 (new body)
    with BuildSketch(Plane.XZ.offset(-35.6432670365)):
        with BuildLine():
            ThreePointArc((23, 25), (24.4142135624, 24.4142135624), (25, 23))
            Line((25, 23), (25, 25))
            Line((25, 25), (23, 25))
        make_face()
    extrude(amount=-F18_T81_DEPTH)

    split(bisect_by=Plane(origin=(-9.2266829073, 30.1791199472, 0), x_dir=(0, 0, 1), z_dir=(-0.2923717047, 0.956304756, 0)), keep=Keep.TOP)

    split(bisect_by=Plane(origin=(-34.9845202296, 28.9355418232, 0), x_dir=(0, 0, 1), z_dir=(0.7705799894, -0.6373432983, 0)), keep=Keep.TOP)


with BuildPart() as f1_12:
    add(f1_11.part)

    # F18_t78: cut F18_tool79
    add(f18_tool79.part, mode=Mode.SUBTRACT)


with BuildPart() as f18_tool85:
    # F18_s86 → F18_t87 (new body)
    with BuildSketch(Plane.XZ.offset(-106.4598330308)):
        with BuildLine():
            ThreePointArc((0, 2), (0.5857864376, 0.5857864376), (2, 0))
            Line((2, 0), (0, 0))
            Line((0, 0), (0, 2))
        make_face()
    extrude(amount=F18_T87_DEPTH)

    split(bisect_by=Plane(origin=(49.8293582326, 41.2136416249, 0), x_dir=(0, 0, 1), z_dir=(0.7705799894, 0.6373432983, 0)), keep=Keep.TOP)

    split(bisect_by=Plane(origin=(0, 4.5467421163, 20.9913990025), x_dir=(1, 0, 0), z_dir=(0, -0.2116913388, -0.9773365731)), keep=Keep.TOP)


with BuildPart() as f1_13:
    add(f1_12.part)

    # F18_t84: cut F18_tool85
    add(f18_tool85.part, mode=Mode.SUBTRACT)


with BuildPart() as f18_tool91:
    # F18_s92 → F18_t93 (new body)
    with BuildSketch(Plane.XZ.offset(-106.4598330308)):
        with BuildLine():
            ThreePointArc((0, 2), (0.5857864376, 0.5857864376), (2, 0))
            Line((2, 0), (0, 0))
            Line((0, 0), (0, 2))
        make_face()
    extrude(amount=F18_T93_DEPTH)

    split(bisect_by=Plane(origin=(49.8293582326, 41.2136416249, 0), x_dir=(0, 0, 1), z_dir=(-0.7705799894, -0.6373432983, 0)), keep=Keep.TOP)

    split(bisect_by=Plane(origin=(0, 4.5467421163, 20.9913990025), x_dir=(1, 0, 0), z_dir=(0, 0.2116913388, 0.9773365731)), keep=Keep.TOP)


with BuildPart() as f1_14:
    add(f1_13.part)

    # F18_t90: cut F18_tool91
    add(f18_tool91.part, mode=Mode.SUBTRACT)


with BuildPart() as f18_tool97:
    # F18_s98 → F18_t99 (new body)
    with BuildSketch(Plane.XZ.offset(-106.4598330308)):
        with BuildLine():
            ThreePointArc((0, 2), (0.5857864376, 0.5857864376), (2, 0))
            Line((2, 0), (0, 0))
            Line((0, 0), (0, 2))
        make_face()
    extrude(amount=F18_T99_DEPTH)

    split(bisect_by=Plane(origin=(-9.2266829073, 30.1791199472, 0), x_dir=(0, 0, 1), z_dir=(-0.2923717047, 0.956304756, 0)), keep=Keep.TOP)

    split(bisect_by=Plane(origin=(49.8293582326, 41.2136416249, 0), x_dir=(0, 0, 1), z_dir=(-0.7705799894, -0.6373432983, 0)), keep=Keep.TOP)

    split(bisect_by=Plane(origin=(0, 4.5467421163, 20.9913990025), x_dir=(1, 0, 0), z_dir=(0, -0.2116913388, -0.9773365731)), keep=Keep.TOP)


with BuildPart() as f1_15:
    add(f1_14.part)

    # F18_t96: cut F18_tool97
    add(f18_tool97.part, mode=Mode.SUBTRACT)


with BuildPart() as f18_tool104:
    # F18_s105 → F18_t106 (new body)
    with BuildSketch(Plane.XZ.offset(-106.4598330308)):
        with BuildLine():
            ThreePointArc((2, 25), (0.5857864376, 24.4142135624), (0, 23))
            Line((0, 23), (0, 25))
            Line((0, 25), (2, 25))
        make_face()
    extrude(amount=F18_T106_DEPTH)

    split(bisect_by=Plane(origin=(-9.2266829073, 30.1791199472, 0), x_dir=(0, 0, 1), z_dir=(-0.2923717047, 0.956304756, 0)), keep=Keep.TOP)

    split(bisect_by=Plane(origin=(49.8293582326, 41.2136416249, 0), x_dir=(0, 0, 1), z_dir=(-0.7705799894, -0.6373432983, 0)), keep=Keep.TOP)


with BuildPart() as f1_16:
    add(f1_15.part)

    # F18_t103: cut F18_tool104
    add(f18_tool104.part, mode=Mode.SUBTRACT)


with BuildPart() as f18_tool110:
    # F18_s111 → F18_t112 (new body)
    with BuildSketch(Plane.XZ.offset(-182)):
        with BuildLine():
            ThreePointArc((0, 2), (0.5857864376, 0.5857864376), (2, 0))
            Line((2, 0), (0, 0))
            Line((0, 0), (0, 2))
        make_face()
    extrude(amount=F18_T112_DEPTH)

    split(bisect_by=Plane(origin=(-27.8614600507, 131.0778638485, 0), x_dir=(0, 0, 1), z_dir=(-0.2079116908, 0.9781476007, 0)), keep=Keep.TOP)


with BuildPart() as f1_17:
    add(f1_16.part)

    # F18_t109: cut F18_tool110
    add(f18_tool110.part, mode=Mode.SUBTRACT)


with BuildPart() as f18_tool115:
    # F18_s116 → F18_t117 (new body)
    with BuildSketch(Plane.XZ.offset(-182)):
        with BuildLine():
            ThreePointArc((2, 25), (0.5857864376, 24.4142135624), (0, 23))
            Line((0, 23), (0, 25))
            Line((0, 25), (2, 25))
        make_face()
    extrude(amount=F18_T117_DEPTH)

    split(bisect_by=Plane(origin=(-27.8614600507, 131.0778638485, 0), x_dir=(0, 0, 1), z_dir=(-0.2079116908, 0.9781476007, 0)), keep=Keep.TOP)


with BuildPart() as f1_18:
    add(f1_17.part)

    # F18_t114: cut F18_tool115
    add(f18_tool115.part, mode=Mode.SUBTRACT)


with BuildPart() as f18_tool120:
    # F18_s121 → F18_t122 (new body)
    with BuildSketch(Plane.XZ.offset(-137.3139140418)):
        with BuildLine():
            ThreePointArc((23, 25), (24.4142135624, 24.4142135624), (25, 23))
            Line((25, 23), (25, 25))
            Line((25, 25), (23, 25))
        make_face()
    extrude(amount=-F18_T122_DEPTH)

    split(bisect_by=Plane(origin=(-27.8614600507, 131.0778638485, 0), x_dir=(0, 0, 1), z_dir=(-0.2079116908, 0.9781476007, 0)), keep=Keep.TOP)


with BuildPart() as f1_19:
    add(f1_18.part)

    # F18_t119: cut F18_tool120
    add(f18_tool120.part, mode=Mode.SUBTRACT)


with BuildPart() as f18_tool125:
    # F18_s126 → F18_t127 (new body)
    with BuildSketch(Plane.XZ.offset(-137.3139140418)):
        with BuildLine():
            ThreePointArc((25, 2), (24.4142135624, 0.5857864376), (23, 0))
            Line((23, 0), (25, 0))
            Line((25, 0), (25, 2))
        make_face()
    extrude(amount=-F18_T127_DEPTH)

    split(bisect_by=Plane(origin=(-27.8614600507, 131.0778638485, 0), x_dir=(0, 0, 1), z_dir=(-0.2079116908, 0.9781476007, 0)), keep=Keep.TOP)


with BuildPart() as f1_20:
    add(f1_19.part)

    # F18_t124: cut F18_tool125
    add(f18_tool125.part, mode=Mode.SUBTRACT)


with BuildPart() as f18_tool131:
    # F18_s132 → F18_t133 (new body)
    with BuildSketch(Plane.XZ.offset(-35.6432670365)):
        with BuildLine():
            ThreePointArc((23, 25), (24.4142135624, 24.4142135624), (25, 23))
            Line((25, 23), (25, 25))
            Line((25, 25), (23, 25))
        make_face()
    extrude(amount=-F18_T133_DEPTH)

    split(bisect_by=Plane(origin=(-34.9845202296, 28.9355418232, 0), x_dir=(0, 0, 1), z_dir=(-0.7705799894, 0.6373432983, 0)), keep=Keep.TOP)


with BuildPart() as f18_tool135:
    # F18_s136 → F18_t137 (new body)
    with BuildSketch(Plane(origin=(56.7978037382, 68.6713912604, 0), x_dir=(0, 0, 1), z_dir=(0.6373432983, 0.7705799894, 0))):
        with BuildLine():
            ThreePointArc((25, -47.4002448925), (24.4142135624, -45.9860313302), (23, -45.4002448925))
            Line((23, -45.4002448925), (25, -45.4002448925))
            Line((25, -45.4002448925), (25, -47.4002448925))
        make_face()
    extrude(amount=F18_T137_DEPTH)

    split(bisect_by=Plane.YZ.offset(25), keep=Keep.BOTTOM)


with BuildPart() as f18_tool131_1:
    add(f18_tool131.part)

    # F18_t139: intersect F18_tool135
    add(f18_tool135.part, mode=Mode.INTERSECT)


with BuildPart() as f1_21:
    add(f1_20.part)

    # F18_t129: cut F18_tool131
    add(f18_tool131_1.part, mode=Mode.SUBTRACT)


with BuildPart() as f18_tool142:
    # F18_s143 → F18_t144 (new body)
    with BuildSketch(Plane.XZ.offset(-35.6432670365)):
        with BuildLine():
            ThreePointArc((25, 2), (24.4142135624, 0.5857864376), (23, 0))
            Line((23, 0), (25, 0))
            Line((25, 0), (25, 2))
        make_face()
    extrude(amount=-F18_T144_DEPTH)

    split(bisect_by=Plane(origin=(-34.9845202296, 28.9355418232, 0), x_dir=(0, 0, 1), z_dir=(-0.7705799894, 0.6373432983, 0)), keep=Keep.TOP)

    split(bisect_by=Plane(origin=(0, 4.5467421163, 20.9913990025), x_dir=(1, 0, 0), z_dir=(0, 0.2116913388, 0.9773365731)), keep=Keep.TOP)


with BuildPart() as f18_tool147:
    # F18_s148 → F18_t149 (new body)
    with BuildSketch(Plane(origin=(55.6145080943, 67.2407275237, -14.5643578937), x_dir=(-0.7705799894, 0.6373432983, 0), z_dir=(0.6286469564, 0.7600656763, -0.1646304099))):
        with BuildLine():
            ThreePointArc((45.4002448925, 17.2405635017), (45.8936460368, 15.9252080791), (47.1304047803, 15.258850527))
            Line((47.1304047803, 15.258850527), (45.4002448925, 15.4944378922))
            Line((45.4002448925, 15.4944378922), (45.4002448925, 17.2405635017))
        make_face()
    extrude(amount=F18_T149_DEPTH)

    split(bisect_by=Plane.YZ.offset(25), keep=Keep.BOTTOM)

    split(bisect_by=Plane.XY, keep=Keep.TOP)


with BuildPart() as f18_tool142_1:
    add(f18_tool142.part)

    # F18_t152: intersect F18_tool147
    add(f18_tool147.part, mode=Mode.INTERSECT)


with BuildPart() as f1_22:
    add(f1_21.part)

    # F18_t140: cut F18_tool142
    add(f18_tool142_1.part, mode=Mode.SUBTRACT)


with BuildPart() as f18_tool155:
    # F18_s156 → F18_t157 (new body)
    with BuildSketch(Plane(origin=(-76.2230659478, 92.1575068097, -19.9613383317), x_dir=(0.7705799894, 0.6373432983, 0), z_dir=(0.6286469564, -0.7600656763, 0.1646304099))):
        with BuildLine():
            ThreePointArc((64.6647446284, 14.617411291), (65.1581457726, 13.3020558683), (66.3949045162, 12.6356983163))
            Line((66.3949045162, 12.6356983163), (64.6647446284, 12.8712856815))
            Line((64.6647446284, 12.8712856815), (64.6647446284, 14.617411291))
        make_face()
    extrude(amount=F18_T157_DEPTH)

    split(bisect_by=Plane.YZ, keep=Keep.TOP)

    split(bisect_by=Plane.XY, keep=Keep.TOP)


with BuildPart() as f18_tool160:
    # F18_s161 → F18_t162 (new body)
    with BuildSketch(Plane.XZ.offset(-106.4598330308)):
        with BuildLine():
            ThreePointArc((0, 2), (0.5857864376, 0.5857864376), (2, 0))
            Line((2, 0), (0, 0))
            Line((0, 0), (0, 2))
        make_face()
    extrude(amount=F18_T162_DEPTH)

    split(bisect_by=Plane(origin=(49.8293582326, 41.2136416249, 0), x_dir=(0, 0, 1), z_dir=(0.7705799894, 0.6373432983, 0)), keep=Keep.TOP)

    split(bisect_by=Plane(origin=(0, 4.5467421163, 20.9913990025), x_dir=(1, 0, 0), z_dir=(0, 0.2116913388, 0.9773365731)), keep=Keep.TOP)


with BuildPart() as f18_tool155_1:
    add(f18_tool155.part)

    # F18_t165: intersect F18_tool160
    add(f18_tool160.part, mode=Mode.INTERSECT)


with BuildPart() as f1_23:
    add(f1_22.part)

    # F18_t153: cut F18_tool155
    add(f18_tool155_1.part, mode=Mode.SUBTRACT)


with BuildPart() as f18_tool168:
    # F18_s169 → F18_t170 (new body)
    with BuildSketch(Plane(origin=(-78.016074724, 94.3253442805, 0), x_dir=(0, 0, 1), z_dir=(0.6373432983, -0.7705799894, 0))):
        with BuildLine():
            ThreePointArc((25, -66.6647446284), (24.4142135624, -65.250531066), (23, -64.6647446284))
            Line((23, -64.6647446284), (25, -64.6647446284))
            Line((25, -64.6647446284), (25, -66.6647446284))
        make_face()
    extrude(amount=F18_T170_DEPTH)

    split(bisect_by=Plane.YZ, keep=Keep.TOP)


with BuildPart() as f18_tool172:
    # F18_s173 → F18_t174 (new body)
    with BuildSketch(Plane.XZ.offset(-106.4598330308)):
        with BuildLine():
            ThreePointArc((2, 25), (0.5857864376, 24.4142135624), (0, 23))
            Line((0, 23), (0, 25))
            Line((0, 25), (2, 25))
        make_face()
    extrude(amount=F18_T174_DEPTH)

    split(bisect_by=Plane(origin=(49.8293582326, 41.2136416249, 0), x_dir=(0, 0, 1), z_dir=(0.7705799894, 0.6373432983, 0)), keep=Keep.TOP)


with BuildPart() as f18_tool168_1:
    add(f18_tool168.part)

    # F18_t176: intersect F18_tool172
    add(f18_tool172.part, mode=Mode.INTERSECT)


with BuildPart() as f1_24:
    add(f1_23.part)

    # F18_t166: cut F18_tool168
    add(f18_tool168_1.part, mode=Mode.SUBTRACT)


solid = f1_24.part
